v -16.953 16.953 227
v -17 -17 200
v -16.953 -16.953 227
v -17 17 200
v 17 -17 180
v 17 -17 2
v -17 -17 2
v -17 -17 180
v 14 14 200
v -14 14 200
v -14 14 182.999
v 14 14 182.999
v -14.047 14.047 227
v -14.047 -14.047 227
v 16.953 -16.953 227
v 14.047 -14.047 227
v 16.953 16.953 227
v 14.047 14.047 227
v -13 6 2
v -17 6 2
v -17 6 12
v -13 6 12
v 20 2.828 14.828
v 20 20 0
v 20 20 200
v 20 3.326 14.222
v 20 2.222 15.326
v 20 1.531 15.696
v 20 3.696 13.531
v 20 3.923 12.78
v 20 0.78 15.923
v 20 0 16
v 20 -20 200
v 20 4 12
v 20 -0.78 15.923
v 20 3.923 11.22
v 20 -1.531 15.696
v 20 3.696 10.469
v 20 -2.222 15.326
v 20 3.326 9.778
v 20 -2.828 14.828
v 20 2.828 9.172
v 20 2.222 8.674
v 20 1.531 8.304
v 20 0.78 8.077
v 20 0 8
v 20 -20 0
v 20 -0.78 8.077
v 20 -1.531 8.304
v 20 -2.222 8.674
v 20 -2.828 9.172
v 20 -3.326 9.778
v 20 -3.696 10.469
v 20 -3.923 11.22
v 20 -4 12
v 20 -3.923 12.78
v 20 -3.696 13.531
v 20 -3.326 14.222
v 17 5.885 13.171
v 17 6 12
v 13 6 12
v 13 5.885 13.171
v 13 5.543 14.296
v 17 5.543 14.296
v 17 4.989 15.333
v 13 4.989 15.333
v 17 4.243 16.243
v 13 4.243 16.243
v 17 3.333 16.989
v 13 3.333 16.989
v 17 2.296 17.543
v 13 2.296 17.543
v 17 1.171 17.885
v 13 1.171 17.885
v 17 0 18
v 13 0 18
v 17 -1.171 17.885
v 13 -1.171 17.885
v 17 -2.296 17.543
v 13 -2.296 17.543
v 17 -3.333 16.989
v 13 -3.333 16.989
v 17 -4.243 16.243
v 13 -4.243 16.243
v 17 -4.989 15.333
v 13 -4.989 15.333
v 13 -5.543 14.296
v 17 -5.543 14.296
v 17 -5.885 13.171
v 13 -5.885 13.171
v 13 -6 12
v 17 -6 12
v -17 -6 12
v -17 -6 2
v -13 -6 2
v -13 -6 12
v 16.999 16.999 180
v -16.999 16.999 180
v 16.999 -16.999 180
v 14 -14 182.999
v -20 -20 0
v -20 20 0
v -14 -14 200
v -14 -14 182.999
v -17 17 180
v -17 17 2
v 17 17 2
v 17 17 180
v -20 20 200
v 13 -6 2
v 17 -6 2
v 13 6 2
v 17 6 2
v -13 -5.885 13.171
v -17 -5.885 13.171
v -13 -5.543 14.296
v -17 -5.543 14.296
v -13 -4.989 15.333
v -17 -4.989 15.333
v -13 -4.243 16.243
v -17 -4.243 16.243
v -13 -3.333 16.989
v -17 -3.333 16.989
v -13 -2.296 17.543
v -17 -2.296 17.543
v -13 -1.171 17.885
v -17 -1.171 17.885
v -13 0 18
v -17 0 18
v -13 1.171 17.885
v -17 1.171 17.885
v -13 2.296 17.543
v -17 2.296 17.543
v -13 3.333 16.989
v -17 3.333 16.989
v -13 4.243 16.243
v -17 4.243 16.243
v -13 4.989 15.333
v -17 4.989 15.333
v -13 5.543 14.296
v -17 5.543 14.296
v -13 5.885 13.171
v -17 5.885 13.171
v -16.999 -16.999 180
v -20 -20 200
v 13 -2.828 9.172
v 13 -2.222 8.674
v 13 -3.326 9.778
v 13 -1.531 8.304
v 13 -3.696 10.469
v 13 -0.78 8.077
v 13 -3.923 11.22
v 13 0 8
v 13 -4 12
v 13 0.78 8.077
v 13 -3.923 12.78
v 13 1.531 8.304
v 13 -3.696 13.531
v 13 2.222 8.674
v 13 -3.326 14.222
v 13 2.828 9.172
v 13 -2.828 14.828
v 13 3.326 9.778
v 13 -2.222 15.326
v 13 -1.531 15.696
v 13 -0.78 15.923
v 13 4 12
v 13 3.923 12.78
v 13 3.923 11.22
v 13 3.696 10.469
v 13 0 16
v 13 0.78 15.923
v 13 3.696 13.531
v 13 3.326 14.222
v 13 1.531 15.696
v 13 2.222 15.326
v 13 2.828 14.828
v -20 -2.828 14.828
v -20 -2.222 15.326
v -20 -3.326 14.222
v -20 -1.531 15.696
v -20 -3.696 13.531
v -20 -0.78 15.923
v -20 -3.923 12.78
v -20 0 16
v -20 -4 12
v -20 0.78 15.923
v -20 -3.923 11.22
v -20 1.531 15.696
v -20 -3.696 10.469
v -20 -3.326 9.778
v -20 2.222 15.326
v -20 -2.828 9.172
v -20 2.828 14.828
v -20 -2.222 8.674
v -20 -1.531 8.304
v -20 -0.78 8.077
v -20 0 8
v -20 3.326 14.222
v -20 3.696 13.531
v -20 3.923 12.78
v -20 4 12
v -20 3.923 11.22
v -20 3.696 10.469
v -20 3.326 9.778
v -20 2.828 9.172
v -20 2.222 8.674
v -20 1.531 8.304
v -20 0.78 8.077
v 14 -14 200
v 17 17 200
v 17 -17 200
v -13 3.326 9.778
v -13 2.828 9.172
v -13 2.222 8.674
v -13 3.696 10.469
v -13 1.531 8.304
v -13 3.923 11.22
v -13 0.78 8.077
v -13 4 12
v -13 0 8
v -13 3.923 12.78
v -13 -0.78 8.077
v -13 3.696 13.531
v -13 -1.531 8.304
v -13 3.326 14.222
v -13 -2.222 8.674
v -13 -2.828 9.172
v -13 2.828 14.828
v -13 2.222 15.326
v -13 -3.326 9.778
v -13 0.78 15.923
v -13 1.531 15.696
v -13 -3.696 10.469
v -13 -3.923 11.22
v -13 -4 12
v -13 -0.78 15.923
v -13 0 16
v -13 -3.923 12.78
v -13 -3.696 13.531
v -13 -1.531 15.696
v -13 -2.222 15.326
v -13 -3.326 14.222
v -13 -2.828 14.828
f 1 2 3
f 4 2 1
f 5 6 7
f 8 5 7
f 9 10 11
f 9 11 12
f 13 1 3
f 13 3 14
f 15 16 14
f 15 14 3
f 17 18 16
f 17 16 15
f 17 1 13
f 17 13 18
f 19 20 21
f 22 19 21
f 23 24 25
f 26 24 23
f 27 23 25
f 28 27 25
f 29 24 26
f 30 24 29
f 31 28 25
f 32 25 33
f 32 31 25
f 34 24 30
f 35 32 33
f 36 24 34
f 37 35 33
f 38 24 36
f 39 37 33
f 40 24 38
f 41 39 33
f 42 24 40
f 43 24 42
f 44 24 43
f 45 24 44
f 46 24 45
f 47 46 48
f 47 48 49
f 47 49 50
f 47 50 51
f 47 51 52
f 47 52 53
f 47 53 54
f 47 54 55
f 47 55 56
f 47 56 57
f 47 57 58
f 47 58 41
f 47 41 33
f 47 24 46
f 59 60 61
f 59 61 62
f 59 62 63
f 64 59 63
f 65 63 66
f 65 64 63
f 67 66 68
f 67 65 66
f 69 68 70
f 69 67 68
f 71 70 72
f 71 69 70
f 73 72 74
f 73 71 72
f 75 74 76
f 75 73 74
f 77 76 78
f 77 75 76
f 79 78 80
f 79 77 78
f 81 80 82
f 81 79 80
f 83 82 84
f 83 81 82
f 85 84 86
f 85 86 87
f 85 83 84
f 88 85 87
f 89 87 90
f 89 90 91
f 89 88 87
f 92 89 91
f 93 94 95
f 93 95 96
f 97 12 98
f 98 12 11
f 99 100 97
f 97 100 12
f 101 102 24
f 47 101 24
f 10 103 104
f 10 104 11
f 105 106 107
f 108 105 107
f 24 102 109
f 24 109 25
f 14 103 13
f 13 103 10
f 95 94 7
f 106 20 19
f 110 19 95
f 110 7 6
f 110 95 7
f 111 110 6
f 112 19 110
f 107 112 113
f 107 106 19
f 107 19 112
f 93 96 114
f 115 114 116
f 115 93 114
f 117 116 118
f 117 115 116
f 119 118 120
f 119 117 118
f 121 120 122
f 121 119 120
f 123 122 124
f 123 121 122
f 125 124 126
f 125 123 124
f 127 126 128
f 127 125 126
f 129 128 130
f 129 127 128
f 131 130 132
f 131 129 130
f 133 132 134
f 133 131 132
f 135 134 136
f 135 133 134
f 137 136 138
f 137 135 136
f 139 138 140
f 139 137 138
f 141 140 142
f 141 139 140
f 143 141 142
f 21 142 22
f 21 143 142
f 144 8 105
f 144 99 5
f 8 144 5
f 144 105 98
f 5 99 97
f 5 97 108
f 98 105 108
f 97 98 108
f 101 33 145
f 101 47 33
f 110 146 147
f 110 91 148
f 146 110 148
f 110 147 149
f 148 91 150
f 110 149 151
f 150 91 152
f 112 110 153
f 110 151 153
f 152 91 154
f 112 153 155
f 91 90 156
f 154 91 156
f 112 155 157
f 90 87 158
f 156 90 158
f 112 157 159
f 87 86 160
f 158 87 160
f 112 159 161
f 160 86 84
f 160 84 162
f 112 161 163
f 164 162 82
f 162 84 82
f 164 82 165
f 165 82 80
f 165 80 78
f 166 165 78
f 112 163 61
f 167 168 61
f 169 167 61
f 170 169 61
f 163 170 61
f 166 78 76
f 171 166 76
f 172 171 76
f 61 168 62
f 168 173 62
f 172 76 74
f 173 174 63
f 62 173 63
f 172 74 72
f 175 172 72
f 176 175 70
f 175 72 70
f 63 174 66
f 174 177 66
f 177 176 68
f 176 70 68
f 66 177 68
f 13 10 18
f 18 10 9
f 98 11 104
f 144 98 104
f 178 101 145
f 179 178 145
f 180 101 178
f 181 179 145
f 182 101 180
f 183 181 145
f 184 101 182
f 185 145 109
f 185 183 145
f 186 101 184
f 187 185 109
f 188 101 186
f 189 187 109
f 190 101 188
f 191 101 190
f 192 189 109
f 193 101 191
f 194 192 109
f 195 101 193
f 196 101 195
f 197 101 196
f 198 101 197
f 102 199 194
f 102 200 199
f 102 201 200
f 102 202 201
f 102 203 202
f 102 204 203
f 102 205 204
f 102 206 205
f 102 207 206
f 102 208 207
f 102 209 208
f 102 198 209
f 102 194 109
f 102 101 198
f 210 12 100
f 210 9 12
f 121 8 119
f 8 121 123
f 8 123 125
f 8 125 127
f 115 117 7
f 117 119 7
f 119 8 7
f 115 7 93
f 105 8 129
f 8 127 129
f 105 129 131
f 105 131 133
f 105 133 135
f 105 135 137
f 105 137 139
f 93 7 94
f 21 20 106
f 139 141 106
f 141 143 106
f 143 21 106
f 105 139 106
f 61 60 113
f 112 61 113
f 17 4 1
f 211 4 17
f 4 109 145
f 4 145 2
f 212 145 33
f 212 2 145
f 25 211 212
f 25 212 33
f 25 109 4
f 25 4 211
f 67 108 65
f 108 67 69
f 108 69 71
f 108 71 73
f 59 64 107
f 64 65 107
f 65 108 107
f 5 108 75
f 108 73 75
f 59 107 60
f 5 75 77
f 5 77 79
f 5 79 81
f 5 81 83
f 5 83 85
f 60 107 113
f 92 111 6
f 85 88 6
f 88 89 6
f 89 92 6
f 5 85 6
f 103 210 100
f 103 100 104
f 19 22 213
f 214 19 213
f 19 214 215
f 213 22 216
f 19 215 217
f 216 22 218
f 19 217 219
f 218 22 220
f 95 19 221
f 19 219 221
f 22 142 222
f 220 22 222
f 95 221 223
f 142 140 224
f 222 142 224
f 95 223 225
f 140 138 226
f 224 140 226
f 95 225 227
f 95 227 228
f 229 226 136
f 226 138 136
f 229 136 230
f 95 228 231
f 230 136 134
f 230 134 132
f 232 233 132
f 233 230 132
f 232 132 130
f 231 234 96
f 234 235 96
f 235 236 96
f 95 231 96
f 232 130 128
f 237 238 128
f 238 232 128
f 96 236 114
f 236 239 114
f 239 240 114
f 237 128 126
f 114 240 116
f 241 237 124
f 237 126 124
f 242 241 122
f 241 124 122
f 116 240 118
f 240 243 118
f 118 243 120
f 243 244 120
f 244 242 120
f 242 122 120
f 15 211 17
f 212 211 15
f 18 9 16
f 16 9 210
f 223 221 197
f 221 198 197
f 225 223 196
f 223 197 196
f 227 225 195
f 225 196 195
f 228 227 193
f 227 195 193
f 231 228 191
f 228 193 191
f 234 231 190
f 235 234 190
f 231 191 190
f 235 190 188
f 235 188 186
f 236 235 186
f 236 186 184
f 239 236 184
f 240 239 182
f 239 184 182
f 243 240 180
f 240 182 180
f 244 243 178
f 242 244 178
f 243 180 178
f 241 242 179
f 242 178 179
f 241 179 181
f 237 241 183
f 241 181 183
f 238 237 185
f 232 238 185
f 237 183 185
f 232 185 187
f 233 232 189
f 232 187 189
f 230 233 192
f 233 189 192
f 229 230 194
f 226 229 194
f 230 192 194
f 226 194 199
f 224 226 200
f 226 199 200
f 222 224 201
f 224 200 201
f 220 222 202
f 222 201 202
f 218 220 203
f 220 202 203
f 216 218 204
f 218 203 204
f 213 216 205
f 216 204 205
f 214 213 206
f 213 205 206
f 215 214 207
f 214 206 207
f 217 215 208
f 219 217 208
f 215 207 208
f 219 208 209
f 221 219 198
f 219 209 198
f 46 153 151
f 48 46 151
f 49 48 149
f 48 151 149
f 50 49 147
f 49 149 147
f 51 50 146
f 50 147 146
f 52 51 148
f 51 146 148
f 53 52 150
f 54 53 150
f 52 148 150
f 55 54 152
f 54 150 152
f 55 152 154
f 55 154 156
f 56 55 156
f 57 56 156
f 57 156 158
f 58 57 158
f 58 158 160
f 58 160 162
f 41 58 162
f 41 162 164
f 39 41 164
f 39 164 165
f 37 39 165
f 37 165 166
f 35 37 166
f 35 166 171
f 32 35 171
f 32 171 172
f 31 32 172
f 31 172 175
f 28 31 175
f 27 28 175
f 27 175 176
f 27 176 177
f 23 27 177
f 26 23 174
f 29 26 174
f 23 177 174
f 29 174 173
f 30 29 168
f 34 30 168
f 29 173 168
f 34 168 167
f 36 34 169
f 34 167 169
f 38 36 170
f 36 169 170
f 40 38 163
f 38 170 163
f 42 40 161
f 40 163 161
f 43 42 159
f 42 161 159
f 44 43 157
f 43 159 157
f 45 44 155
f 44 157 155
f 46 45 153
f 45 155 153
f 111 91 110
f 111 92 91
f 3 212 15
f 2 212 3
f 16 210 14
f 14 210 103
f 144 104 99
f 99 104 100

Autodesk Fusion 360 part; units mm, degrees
sketch "Sketch1" plane through (0, 0, 0) normal (0, 0, 1) x (1, 0, 0)
  line L0 (20, -20) -> (-20, -20)
  line L1 (-20, -20) -> (-20, 20)
  line L2 (-20, 20) -> (20, 20)
  line L3 (20, 20) -> (20, -20)
  line L4 (20, -20) -> (-20, 20) construction
  line L5 (-20, -20) -> (20, 20) construction
  line L6 (-17, -17) -> (-17, 17)
  line L7 (-17, 17) -> (17, 17)
  line L8 (17, 17) -> (17, -17)
  line L9 (17, -17) -> (-17, -17)
  line L10 (-14, -14) -> (-14, 14)
  line L11 (-14, 14) -> (14, 14)
  line L12 (14, 14) -> (14, -14)
  line L13 (14, -14) -> (-14, -14)
  dimension "d1" = 40
  dimension "d2" = 40
  dimension "d3" = 3
  dimension "d4" = 6
extrude "Extrude1" add sketch "Sketch1" along normal blind 200 contours L0 L1 L2 L3 makes body 1
extrude "Extrude2" add sketch "Sketch1" along normal blind 27 draft -0.1 from surface at 200 separate body contours L6 L7 L8 L9 makes body 2
extrude "Extrude3" add 1 faces at (4.6667, -16, 200) along direction (0, 0, -1) blind 20 on bodies 2 bodies 1 2
chamfer "Chamfer1" distance 3 angle 45 4 edges at (0, 14, 180) (-14, 0, 180) (0, -14, 180) (14, 0, 180) on bodies 1
extrude "Extrude4" add sketch "Sketch1" along normal blind 2 contours L6 L7 L8 L9 | L10 L11 L12 L13 bodies 1
sketch "Sketch2" plane through (20, 0, 0) normal (1, 0, 0) x (0, 1, 0)
  line L0 (-20, 0) -> (20, 0)
  line L1 (20, 0) -> (20, 200)
  line L2 (20, 200) -> (-20, 200)
  line L3 (-20, 200) -> (-20, 0)
  circle A0 centre (0, 12) radius 4
  circle A1 centre (0, 12) radius 6
  line L4 (-6, 12) -> (-6, -0.3727)
  line L5 (6, 12) -> (6, 0)
  dimension "d15" = 8
  dimension "d16" = 12
  dimension "d17" = 2
extrude "Extrude5" add sketch "Sketch2" against normal blind 7 contours L0 A1 L4 L5 | A1 | A0 bodies 1
mirror "Mirror1" about plane through (0, 0, 0) normal (1, 0, 0) of "Extrude5"
hole "Hole1" at (20, 0, 12) direction (-1, 0, 0) diameter 8 end up to surface (40 mm away) bodies 1
